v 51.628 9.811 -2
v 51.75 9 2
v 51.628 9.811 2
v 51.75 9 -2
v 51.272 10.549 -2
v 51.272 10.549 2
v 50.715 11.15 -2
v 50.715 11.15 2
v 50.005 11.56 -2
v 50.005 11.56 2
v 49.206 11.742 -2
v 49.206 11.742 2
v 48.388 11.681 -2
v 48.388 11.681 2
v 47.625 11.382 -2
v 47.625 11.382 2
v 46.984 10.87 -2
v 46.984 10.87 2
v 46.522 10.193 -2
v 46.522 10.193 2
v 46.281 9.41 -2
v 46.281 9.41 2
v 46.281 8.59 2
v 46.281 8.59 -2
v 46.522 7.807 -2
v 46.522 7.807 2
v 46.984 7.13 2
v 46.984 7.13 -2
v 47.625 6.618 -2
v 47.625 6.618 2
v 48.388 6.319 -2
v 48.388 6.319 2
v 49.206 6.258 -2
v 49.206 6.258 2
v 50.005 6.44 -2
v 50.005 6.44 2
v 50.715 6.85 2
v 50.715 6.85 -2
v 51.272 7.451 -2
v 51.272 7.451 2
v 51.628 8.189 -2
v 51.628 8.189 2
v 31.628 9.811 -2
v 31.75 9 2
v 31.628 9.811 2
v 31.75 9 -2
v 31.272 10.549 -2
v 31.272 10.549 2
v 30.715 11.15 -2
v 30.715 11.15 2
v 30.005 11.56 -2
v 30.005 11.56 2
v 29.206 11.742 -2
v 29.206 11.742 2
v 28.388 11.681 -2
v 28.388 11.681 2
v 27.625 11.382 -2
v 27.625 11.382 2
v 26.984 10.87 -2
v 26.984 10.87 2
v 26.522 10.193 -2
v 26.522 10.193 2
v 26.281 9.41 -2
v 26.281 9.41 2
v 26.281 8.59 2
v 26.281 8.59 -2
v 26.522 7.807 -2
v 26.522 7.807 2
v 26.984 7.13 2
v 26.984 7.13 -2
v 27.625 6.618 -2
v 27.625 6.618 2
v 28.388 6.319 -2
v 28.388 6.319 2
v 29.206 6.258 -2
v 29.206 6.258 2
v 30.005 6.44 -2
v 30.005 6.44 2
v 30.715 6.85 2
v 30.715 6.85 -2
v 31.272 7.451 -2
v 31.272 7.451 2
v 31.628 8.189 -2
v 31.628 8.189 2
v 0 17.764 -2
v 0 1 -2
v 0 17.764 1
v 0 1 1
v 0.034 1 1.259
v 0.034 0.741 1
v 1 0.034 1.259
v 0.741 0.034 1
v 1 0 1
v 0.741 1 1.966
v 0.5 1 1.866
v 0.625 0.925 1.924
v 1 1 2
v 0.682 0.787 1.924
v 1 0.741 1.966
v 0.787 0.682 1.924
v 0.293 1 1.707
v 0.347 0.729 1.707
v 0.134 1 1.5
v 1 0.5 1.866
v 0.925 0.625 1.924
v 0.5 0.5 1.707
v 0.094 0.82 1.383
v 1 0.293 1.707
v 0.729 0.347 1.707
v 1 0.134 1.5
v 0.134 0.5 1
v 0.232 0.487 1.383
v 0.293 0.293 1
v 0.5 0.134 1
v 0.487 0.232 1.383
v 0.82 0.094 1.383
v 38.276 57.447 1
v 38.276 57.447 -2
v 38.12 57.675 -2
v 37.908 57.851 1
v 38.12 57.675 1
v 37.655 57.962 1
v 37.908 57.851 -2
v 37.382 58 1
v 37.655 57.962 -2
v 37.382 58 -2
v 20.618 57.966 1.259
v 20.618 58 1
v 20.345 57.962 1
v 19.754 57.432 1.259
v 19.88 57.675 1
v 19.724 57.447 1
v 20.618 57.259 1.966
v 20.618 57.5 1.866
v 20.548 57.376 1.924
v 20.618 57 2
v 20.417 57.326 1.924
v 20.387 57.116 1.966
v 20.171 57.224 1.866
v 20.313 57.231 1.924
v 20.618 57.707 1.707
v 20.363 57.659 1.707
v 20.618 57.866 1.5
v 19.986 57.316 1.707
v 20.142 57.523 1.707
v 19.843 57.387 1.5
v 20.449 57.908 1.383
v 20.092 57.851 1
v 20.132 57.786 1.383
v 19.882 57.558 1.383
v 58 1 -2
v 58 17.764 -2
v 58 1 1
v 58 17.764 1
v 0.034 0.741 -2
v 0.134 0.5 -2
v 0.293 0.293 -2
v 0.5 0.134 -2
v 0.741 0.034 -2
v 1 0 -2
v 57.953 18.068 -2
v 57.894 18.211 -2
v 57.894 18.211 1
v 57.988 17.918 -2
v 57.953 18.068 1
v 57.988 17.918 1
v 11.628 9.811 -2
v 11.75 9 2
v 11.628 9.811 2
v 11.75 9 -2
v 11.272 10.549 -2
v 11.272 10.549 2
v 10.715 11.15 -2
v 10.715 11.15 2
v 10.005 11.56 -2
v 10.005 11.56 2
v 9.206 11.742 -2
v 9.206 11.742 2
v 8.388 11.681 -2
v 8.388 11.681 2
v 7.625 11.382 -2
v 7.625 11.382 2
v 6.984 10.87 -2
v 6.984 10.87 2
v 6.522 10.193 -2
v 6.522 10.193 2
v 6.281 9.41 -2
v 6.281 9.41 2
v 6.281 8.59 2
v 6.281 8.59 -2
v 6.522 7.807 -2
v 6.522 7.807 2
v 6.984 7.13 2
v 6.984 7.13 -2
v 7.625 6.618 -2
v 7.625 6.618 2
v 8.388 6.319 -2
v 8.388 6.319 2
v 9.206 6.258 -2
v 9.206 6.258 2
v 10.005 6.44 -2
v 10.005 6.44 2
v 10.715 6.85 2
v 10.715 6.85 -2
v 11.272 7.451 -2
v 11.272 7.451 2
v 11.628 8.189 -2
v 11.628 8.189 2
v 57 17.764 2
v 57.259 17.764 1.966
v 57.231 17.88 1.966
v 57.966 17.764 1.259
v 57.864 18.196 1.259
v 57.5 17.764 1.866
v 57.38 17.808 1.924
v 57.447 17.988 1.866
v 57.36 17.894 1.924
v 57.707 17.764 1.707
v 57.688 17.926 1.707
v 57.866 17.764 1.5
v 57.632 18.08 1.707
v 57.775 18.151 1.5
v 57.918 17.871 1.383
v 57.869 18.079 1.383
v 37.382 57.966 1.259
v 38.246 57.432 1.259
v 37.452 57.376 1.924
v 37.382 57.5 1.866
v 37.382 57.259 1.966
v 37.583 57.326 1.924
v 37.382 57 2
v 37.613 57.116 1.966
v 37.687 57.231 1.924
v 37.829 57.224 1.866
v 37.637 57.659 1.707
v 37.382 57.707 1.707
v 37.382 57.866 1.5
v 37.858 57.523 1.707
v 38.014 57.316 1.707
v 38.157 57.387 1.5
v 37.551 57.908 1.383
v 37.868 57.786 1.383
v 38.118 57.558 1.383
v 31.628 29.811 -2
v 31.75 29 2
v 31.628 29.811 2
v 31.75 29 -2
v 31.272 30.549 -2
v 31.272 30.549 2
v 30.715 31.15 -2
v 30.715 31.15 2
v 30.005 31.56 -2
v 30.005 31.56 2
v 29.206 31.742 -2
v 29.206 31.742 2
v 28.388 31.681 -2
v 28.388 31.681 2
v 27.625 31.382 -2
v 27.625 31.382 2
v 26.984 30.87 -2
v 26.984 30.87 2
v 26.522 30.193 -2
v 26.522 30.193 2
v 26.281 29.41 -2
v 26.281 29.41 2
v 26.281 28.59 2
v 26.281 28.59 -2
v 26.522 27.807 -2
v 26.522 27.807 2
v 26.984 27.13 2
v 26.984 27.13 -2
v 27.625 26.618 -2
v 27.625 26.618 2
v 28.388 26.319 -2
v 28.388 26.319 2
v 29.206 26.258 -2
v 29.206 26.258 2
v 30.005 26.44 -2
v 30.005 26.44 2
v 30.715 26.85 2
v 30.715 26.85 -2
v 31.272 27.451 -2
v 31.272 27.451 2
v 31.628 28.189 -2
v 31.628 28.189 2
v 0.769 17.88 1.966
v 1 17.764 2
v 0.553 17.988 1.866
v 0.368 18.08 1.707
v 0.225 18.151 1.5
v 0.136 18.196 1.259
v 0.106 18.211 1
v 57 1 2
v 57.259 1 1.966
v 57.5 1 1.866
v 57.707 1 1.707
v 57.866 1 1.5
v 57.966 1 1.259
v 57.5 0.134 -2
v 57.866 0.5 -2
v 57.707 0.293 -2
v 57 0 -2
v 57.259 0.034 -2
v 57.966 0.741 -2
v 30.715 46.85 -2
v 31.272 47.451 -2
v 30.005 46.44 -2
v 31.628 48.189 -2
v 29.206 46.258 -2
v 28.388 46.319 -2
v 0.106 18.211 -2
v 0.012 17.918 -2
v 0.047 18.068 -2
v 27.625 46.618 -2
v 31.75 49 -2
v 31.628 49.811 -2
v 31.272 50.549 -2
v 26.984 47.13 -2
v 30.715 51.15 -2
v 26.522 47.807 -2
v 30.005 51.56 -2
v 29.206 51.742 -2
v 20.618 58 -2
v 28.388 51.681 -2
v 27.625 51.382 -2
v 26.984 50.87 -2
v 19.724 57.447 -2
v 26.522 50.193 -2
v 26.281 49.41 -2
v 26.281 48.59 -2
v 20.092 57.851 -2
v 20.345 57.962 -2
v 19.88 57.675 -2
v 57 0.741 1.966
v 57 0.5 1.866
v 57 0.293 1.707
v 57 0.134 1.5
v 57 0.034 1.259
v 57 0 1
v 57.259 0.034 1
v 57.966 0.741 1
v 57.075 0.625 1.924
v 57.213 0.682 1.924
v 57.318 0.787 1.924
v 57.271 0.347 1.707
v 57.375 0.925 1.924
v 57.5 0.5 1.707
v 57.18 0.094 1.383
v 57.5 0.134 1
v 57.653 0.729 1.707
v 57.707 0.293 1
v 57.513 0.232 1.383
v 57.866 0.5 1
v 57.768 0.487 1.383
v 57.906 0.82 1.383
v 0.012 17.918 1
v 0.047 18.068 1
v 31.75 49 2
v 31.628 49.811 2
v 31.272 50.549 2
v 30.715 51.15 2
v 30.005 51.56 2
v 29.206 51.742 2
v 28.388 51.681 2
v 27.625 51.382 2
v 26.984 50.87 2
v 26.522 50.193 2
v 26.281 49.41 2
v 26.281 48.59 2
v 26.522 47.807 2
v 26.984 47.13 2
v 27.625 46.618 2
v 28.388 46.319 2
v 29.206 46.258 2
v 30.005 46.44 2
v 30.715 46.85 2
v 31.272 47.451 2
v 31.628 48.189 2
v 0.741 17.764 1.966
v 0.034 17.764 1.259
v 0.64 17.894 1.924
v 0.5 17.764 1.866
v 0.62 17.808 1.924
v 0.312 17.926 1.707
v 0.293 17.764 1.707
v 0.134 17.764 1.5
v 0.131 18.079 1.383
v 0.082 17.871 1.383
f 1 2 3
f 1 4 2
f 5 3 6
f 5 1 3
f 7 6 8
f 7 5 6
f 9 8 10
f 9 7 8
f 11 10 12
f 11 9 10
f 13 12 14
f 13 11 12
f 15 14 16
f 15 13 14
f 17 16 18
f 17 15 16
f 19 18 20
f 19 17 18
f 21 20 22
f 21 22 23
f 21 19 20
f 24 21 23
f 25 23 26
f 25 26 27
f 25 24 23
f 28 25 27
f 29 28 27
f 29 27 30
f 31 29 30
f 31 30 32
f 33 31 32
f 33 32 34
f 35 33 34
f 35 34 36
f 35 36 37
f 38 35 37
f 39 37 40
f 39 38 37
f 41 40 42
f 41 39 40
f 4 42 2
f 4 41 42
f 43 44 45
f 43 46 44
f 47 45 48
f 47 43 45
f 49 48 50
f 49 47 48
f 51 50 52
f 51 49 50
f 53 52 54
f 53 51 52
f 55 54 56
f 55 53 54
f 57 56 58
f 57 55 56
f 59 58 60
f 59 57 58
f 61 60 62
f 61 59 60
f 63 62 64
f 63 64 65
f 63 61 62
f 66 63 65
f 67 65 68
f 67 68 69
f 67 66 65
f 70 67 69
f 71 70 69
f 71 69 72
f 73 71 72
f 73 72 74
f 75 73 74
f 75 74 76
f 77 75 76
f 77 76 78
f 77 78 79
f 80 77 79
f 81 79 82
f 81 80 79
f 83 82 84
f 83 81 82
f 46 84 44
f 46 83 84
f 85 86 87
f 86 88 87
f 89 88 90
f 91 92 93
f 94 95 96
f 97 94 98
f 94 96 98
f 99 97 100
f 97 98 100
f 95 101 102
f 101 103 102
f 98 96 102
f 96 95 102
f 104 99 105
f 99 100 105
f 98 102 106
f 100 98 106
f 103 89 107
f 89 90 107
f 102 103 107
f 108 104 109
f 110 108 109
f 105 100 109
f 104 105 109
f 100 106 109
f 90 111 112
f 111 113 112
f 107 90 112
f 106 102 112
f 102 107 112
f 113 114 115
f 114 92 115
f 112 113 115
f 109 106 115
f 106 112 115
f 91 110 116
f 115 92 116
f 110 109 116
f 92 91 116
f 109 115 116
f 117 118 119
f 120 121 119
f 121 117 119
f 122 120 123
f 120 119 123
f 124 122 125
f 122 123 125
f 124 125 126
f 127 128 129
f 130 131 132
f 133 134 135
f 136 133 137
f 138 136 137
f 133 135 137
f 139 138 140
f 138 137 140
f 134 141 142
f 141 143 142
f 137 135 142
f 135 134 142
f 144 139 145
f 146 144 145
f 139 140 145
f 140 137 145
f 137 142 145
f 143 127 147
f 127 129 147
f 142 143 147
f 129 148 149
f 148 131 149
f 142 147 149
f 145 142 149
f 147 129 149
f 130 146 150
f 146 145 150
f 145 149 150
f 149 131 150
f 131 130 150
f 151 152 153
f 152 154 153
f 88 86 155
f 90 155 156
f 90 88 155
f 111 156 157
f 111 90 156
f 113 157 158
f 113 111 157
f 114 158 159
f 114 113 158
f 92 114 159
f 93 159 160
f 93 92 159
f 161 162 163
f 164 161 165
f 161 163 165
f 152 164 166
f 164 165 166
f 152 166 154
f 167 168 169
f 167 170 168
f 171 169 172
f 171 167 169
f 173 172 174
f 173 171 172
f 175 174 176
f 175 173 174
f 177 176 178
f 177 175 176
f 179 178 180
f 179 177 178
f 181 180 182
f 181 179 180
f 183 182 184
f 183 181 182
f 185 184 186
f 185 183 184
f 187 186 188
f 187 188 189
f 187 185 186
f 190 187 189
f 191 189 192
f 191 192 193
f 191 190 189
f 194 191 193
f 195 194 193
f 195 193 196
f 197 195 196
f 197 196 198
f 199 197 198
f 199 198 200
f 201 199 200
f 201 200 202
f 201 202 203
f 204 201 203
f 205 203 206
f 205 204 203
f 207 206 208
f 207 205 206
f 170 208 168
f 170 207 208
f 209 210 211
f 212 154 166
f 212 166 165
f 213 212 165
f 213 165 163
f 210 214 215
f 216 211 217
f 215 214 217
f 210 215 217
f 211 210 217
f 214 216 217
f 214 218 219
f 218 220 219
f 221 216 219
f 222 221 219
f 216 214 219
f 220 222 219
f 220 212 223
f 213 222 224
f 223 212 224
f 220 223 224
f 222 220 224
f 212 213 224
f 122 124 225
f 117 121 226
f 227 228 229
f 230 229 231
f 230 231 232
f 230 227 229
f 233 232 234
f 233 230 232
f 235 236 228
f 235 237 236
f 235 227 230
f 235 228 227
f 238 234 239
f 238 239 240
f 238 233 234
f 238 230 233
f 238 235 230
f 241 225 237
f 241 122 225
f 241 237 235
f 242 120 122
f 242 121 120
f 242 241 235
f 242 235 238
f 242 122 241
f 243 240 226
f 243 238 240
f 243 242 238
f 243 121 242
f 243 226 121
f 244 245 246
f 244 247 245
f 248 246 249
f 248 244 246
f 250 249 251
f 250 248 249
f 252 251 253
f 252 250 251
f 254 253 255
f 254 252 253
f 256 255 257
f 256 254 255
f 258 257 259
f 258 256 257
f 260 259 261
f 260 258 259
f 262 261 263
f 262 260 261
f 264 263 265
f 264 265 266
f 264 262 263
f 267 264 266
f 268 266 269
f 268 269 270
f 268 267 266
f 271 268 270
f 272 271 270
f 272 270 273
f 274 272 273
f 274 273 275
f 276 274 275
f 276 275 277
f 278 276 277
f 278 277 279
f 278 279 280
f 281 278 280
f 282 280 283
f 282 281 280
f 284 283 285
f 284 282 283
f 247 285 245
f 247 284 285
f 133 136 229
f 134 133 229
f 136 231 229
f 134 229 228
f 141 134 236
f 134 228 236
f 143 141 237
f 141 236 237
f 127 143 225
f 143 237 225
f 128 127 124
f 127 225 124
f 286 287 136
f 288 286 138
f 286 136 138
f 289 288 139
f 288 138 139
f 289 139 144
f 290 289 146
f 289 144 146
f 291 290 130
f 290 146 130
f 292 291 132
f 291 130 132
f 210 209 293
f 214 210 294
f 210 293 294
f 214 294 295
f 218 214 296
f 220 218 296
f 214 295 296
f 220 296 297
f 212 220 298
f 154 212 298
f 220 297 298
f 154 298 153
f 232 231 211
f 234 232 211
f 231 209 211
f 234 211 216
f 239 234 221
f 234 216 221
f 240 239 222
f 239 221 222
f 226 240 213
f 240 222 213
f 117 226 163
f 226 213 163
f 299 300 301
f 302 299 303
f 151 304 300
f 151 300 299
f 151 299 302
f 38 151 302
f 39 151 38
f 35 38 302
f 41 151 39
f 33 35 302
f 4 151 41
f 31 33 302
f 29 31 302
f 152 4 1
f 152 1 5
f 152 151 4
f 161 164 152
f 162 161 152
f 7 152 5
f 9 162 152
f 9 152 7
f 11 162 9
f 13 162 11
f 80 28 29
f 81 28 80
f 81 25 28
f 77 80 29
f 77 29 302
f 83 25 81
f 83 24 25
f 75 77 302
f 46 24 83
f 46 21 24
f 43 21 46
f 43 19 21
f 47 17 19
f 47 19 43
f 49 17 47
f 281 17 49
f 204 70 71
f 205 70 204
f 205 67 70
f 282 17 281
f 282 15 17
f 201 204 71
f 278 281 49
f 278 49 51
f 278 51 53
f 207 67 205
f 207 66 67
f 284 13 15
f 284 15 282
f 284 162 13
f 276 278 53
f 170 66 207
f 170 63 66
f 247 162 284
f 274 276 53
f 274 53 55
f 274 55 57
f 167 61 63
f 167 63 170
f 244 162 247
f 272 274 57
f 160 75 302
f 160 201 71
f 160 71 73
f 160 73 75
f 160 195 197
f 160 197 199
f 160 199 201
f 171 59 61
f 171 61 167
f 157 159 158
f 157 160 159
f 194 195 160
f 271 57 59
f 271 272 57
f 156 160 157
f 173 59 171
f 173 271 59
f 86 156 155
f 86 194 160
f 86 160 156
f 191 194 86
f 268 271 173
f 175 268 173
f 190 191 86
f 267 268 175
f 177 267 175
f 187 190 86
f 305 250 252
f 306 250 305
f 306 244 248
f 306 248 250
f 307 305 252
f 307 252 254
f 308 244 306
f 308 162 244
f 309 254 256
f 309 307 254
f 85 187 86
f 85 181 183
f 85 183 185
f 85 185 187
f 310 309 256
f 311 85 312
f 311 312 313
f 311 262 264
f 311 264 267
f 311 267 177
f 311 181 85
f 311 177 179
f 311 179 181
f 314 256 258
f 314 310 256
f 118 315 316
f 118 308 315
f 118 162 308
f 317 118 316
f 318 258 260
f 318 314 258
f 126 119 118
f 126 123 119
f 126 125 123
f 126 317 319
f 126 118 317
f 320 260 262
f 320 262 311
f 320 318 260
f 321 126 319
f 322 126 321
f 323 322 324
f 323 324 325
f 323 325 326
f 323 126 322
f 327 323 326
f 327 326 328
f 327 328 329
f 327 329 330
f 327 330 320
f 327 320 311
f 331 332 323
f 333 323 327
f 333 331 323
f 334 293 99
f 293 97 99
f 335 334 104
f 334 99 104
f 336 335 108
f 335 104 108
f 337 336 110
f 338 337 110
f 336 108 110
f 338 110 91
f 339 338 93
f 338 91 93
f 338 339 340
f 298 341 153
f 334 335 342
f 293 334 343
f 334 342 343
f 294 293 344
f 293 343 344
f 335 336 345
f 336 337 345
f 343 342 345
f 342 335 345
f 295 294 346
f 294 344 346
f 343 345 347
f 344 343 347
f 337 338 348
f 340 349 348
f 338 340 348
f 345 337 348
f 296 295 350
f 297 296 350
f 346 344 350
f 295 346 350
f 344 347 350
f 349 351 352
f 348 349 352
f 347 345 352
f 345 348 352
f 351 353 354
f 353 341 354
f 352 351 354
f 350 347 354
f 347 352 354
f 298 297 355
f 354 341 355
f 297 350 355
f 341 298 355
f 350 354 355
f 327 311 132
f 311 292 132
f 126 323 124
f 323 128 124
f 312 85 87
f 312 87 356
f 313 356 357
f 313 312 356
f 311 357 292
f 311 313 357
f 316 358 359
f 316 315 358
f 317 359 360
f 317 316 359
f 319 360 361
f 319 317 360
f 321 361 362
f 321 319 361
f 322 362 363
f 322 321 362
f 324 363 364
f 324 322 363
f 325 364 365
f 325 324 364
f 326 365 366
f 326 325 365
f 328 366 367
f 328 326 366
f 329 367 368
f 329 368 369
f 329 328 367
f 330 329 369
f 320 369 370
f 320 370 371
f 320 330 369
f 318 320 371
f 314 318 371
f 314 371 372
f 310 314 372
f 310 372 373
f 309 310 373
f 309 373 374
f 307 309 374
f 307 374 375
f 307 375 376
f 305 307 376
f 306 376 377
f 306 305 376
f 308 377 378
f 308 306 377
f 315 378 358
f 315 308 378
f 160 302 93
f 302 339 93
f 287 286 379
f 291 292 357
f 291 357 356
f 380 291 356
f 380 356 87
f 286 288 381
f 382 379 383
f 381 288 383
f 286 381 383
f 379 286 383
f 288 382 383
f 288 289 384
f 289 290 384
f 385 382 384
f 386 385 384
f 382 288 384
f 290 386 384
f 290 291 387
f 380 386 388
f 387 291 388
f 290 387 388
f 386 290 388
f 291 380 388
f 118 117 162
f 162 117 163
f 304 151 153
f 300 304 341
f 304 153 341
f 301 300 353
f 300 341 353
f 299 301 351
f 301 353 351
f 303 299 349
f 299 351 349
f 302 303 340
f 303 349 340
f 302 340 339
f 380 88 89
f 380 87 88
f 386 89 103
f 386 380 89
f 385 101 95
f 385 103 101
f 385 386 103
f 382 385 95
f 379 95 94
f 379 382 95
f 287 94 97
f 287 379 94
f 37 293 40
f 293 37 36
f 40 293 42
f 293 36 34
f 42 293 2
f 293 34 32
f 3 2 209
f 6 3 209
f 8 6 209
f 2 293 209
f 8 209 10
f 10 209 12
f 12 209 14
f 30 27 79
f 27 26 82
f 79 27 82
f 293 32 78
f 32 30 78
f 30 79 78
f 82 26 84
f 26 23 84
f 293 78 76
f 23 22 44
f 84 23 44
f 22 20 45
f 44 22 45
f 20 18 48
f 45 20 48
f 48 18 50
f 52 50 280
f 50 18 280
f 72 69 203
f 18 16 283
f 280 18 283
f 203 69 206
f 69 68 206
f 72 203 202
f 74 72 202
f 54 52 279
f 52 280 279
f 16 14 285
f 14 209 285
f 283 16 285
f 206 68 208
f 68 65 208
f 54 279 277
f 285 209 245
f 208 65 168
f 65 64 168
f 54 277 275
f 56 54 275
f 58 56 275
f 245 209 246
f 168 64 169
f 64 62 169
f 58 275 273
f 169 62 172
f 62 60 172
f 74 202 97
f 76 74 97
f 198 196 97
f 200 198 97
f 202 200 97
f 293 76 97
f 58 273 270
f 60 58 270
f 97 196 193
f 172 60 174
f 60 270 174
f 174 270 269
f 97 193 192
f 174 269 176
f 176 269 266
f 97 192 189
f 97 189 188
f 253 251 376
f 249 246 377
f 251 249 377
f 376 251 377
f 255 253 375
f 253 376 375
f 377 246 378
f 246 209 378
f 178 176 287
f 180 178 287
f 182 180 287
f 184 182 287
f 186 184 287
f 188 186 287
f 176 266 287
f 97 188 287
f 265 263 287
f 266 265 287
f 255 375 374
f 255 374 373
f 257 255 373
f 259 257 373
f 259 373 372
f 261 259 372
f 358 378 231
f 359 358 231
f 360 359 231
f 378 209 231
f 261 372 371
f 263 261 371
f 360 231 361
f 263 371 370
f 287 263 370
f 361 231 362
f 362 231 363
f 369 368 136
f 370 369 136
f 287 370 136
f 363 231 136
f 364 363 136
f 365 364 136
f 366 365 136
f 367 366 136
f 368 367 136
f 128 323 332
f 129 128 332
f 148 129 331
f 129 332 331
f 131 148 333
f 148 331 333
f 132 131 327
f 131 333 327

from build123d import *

# Parameters (mm, degrees)
SKETCH1_R           = 2.75
BOSS_EXTRUDE1_DEPTH = 2
FILLET1_R           = 1


with BuildPart() as part:
    # Sketch1 → Boss-Extrude1 (new body, symmetric)
    with BuildSketch(Plane.XY):
        Polygon((0, 0), (0, 18), (20, 58), (38, 58), (58, 18), (58, 0), align=None)
        with Locations((9, 9)):
            Circle(SKETCH1_R, mode=Mode.SUBTRACT)
        with Locations((29, 9)):
            Circle(SKETCH1_R, mode=Mode.SUBTRACT)
        with Locations((49, 9)):
            Circle(SKETCH1_R, mode=Mode.SUBTRACT)
        with Locations((29, 29)):
            Circle(SKETCH1_R, mode=Mode.SUBTRACT)
        with Locations((29, 49)):
            Circle(SKETCH1_R, mode=Mode.SUBTRACT)
    extrude(amount=BOSS_EXTRUDE1_DEPTH, both=True)

    # Fillet1
    fillet1_edges = [part.edges().sort_by_distance(p)[0] for p in [
        (48, 38, 2),
        (0, 0, 0),
        (0, 18, 0),
        (20, 58, 0),
        (38, 58, 0),
        (58, 18, 0),
        (58, 0, 0),
        (29, 58, 2),
        (10, 38, 2),
        (0, 9, 2),
        (29, 0, 2),
        (58, 9, 2),
    ]]
    fillet(fillet1_edges, radius=FILLET1_R)


solid = part.part
